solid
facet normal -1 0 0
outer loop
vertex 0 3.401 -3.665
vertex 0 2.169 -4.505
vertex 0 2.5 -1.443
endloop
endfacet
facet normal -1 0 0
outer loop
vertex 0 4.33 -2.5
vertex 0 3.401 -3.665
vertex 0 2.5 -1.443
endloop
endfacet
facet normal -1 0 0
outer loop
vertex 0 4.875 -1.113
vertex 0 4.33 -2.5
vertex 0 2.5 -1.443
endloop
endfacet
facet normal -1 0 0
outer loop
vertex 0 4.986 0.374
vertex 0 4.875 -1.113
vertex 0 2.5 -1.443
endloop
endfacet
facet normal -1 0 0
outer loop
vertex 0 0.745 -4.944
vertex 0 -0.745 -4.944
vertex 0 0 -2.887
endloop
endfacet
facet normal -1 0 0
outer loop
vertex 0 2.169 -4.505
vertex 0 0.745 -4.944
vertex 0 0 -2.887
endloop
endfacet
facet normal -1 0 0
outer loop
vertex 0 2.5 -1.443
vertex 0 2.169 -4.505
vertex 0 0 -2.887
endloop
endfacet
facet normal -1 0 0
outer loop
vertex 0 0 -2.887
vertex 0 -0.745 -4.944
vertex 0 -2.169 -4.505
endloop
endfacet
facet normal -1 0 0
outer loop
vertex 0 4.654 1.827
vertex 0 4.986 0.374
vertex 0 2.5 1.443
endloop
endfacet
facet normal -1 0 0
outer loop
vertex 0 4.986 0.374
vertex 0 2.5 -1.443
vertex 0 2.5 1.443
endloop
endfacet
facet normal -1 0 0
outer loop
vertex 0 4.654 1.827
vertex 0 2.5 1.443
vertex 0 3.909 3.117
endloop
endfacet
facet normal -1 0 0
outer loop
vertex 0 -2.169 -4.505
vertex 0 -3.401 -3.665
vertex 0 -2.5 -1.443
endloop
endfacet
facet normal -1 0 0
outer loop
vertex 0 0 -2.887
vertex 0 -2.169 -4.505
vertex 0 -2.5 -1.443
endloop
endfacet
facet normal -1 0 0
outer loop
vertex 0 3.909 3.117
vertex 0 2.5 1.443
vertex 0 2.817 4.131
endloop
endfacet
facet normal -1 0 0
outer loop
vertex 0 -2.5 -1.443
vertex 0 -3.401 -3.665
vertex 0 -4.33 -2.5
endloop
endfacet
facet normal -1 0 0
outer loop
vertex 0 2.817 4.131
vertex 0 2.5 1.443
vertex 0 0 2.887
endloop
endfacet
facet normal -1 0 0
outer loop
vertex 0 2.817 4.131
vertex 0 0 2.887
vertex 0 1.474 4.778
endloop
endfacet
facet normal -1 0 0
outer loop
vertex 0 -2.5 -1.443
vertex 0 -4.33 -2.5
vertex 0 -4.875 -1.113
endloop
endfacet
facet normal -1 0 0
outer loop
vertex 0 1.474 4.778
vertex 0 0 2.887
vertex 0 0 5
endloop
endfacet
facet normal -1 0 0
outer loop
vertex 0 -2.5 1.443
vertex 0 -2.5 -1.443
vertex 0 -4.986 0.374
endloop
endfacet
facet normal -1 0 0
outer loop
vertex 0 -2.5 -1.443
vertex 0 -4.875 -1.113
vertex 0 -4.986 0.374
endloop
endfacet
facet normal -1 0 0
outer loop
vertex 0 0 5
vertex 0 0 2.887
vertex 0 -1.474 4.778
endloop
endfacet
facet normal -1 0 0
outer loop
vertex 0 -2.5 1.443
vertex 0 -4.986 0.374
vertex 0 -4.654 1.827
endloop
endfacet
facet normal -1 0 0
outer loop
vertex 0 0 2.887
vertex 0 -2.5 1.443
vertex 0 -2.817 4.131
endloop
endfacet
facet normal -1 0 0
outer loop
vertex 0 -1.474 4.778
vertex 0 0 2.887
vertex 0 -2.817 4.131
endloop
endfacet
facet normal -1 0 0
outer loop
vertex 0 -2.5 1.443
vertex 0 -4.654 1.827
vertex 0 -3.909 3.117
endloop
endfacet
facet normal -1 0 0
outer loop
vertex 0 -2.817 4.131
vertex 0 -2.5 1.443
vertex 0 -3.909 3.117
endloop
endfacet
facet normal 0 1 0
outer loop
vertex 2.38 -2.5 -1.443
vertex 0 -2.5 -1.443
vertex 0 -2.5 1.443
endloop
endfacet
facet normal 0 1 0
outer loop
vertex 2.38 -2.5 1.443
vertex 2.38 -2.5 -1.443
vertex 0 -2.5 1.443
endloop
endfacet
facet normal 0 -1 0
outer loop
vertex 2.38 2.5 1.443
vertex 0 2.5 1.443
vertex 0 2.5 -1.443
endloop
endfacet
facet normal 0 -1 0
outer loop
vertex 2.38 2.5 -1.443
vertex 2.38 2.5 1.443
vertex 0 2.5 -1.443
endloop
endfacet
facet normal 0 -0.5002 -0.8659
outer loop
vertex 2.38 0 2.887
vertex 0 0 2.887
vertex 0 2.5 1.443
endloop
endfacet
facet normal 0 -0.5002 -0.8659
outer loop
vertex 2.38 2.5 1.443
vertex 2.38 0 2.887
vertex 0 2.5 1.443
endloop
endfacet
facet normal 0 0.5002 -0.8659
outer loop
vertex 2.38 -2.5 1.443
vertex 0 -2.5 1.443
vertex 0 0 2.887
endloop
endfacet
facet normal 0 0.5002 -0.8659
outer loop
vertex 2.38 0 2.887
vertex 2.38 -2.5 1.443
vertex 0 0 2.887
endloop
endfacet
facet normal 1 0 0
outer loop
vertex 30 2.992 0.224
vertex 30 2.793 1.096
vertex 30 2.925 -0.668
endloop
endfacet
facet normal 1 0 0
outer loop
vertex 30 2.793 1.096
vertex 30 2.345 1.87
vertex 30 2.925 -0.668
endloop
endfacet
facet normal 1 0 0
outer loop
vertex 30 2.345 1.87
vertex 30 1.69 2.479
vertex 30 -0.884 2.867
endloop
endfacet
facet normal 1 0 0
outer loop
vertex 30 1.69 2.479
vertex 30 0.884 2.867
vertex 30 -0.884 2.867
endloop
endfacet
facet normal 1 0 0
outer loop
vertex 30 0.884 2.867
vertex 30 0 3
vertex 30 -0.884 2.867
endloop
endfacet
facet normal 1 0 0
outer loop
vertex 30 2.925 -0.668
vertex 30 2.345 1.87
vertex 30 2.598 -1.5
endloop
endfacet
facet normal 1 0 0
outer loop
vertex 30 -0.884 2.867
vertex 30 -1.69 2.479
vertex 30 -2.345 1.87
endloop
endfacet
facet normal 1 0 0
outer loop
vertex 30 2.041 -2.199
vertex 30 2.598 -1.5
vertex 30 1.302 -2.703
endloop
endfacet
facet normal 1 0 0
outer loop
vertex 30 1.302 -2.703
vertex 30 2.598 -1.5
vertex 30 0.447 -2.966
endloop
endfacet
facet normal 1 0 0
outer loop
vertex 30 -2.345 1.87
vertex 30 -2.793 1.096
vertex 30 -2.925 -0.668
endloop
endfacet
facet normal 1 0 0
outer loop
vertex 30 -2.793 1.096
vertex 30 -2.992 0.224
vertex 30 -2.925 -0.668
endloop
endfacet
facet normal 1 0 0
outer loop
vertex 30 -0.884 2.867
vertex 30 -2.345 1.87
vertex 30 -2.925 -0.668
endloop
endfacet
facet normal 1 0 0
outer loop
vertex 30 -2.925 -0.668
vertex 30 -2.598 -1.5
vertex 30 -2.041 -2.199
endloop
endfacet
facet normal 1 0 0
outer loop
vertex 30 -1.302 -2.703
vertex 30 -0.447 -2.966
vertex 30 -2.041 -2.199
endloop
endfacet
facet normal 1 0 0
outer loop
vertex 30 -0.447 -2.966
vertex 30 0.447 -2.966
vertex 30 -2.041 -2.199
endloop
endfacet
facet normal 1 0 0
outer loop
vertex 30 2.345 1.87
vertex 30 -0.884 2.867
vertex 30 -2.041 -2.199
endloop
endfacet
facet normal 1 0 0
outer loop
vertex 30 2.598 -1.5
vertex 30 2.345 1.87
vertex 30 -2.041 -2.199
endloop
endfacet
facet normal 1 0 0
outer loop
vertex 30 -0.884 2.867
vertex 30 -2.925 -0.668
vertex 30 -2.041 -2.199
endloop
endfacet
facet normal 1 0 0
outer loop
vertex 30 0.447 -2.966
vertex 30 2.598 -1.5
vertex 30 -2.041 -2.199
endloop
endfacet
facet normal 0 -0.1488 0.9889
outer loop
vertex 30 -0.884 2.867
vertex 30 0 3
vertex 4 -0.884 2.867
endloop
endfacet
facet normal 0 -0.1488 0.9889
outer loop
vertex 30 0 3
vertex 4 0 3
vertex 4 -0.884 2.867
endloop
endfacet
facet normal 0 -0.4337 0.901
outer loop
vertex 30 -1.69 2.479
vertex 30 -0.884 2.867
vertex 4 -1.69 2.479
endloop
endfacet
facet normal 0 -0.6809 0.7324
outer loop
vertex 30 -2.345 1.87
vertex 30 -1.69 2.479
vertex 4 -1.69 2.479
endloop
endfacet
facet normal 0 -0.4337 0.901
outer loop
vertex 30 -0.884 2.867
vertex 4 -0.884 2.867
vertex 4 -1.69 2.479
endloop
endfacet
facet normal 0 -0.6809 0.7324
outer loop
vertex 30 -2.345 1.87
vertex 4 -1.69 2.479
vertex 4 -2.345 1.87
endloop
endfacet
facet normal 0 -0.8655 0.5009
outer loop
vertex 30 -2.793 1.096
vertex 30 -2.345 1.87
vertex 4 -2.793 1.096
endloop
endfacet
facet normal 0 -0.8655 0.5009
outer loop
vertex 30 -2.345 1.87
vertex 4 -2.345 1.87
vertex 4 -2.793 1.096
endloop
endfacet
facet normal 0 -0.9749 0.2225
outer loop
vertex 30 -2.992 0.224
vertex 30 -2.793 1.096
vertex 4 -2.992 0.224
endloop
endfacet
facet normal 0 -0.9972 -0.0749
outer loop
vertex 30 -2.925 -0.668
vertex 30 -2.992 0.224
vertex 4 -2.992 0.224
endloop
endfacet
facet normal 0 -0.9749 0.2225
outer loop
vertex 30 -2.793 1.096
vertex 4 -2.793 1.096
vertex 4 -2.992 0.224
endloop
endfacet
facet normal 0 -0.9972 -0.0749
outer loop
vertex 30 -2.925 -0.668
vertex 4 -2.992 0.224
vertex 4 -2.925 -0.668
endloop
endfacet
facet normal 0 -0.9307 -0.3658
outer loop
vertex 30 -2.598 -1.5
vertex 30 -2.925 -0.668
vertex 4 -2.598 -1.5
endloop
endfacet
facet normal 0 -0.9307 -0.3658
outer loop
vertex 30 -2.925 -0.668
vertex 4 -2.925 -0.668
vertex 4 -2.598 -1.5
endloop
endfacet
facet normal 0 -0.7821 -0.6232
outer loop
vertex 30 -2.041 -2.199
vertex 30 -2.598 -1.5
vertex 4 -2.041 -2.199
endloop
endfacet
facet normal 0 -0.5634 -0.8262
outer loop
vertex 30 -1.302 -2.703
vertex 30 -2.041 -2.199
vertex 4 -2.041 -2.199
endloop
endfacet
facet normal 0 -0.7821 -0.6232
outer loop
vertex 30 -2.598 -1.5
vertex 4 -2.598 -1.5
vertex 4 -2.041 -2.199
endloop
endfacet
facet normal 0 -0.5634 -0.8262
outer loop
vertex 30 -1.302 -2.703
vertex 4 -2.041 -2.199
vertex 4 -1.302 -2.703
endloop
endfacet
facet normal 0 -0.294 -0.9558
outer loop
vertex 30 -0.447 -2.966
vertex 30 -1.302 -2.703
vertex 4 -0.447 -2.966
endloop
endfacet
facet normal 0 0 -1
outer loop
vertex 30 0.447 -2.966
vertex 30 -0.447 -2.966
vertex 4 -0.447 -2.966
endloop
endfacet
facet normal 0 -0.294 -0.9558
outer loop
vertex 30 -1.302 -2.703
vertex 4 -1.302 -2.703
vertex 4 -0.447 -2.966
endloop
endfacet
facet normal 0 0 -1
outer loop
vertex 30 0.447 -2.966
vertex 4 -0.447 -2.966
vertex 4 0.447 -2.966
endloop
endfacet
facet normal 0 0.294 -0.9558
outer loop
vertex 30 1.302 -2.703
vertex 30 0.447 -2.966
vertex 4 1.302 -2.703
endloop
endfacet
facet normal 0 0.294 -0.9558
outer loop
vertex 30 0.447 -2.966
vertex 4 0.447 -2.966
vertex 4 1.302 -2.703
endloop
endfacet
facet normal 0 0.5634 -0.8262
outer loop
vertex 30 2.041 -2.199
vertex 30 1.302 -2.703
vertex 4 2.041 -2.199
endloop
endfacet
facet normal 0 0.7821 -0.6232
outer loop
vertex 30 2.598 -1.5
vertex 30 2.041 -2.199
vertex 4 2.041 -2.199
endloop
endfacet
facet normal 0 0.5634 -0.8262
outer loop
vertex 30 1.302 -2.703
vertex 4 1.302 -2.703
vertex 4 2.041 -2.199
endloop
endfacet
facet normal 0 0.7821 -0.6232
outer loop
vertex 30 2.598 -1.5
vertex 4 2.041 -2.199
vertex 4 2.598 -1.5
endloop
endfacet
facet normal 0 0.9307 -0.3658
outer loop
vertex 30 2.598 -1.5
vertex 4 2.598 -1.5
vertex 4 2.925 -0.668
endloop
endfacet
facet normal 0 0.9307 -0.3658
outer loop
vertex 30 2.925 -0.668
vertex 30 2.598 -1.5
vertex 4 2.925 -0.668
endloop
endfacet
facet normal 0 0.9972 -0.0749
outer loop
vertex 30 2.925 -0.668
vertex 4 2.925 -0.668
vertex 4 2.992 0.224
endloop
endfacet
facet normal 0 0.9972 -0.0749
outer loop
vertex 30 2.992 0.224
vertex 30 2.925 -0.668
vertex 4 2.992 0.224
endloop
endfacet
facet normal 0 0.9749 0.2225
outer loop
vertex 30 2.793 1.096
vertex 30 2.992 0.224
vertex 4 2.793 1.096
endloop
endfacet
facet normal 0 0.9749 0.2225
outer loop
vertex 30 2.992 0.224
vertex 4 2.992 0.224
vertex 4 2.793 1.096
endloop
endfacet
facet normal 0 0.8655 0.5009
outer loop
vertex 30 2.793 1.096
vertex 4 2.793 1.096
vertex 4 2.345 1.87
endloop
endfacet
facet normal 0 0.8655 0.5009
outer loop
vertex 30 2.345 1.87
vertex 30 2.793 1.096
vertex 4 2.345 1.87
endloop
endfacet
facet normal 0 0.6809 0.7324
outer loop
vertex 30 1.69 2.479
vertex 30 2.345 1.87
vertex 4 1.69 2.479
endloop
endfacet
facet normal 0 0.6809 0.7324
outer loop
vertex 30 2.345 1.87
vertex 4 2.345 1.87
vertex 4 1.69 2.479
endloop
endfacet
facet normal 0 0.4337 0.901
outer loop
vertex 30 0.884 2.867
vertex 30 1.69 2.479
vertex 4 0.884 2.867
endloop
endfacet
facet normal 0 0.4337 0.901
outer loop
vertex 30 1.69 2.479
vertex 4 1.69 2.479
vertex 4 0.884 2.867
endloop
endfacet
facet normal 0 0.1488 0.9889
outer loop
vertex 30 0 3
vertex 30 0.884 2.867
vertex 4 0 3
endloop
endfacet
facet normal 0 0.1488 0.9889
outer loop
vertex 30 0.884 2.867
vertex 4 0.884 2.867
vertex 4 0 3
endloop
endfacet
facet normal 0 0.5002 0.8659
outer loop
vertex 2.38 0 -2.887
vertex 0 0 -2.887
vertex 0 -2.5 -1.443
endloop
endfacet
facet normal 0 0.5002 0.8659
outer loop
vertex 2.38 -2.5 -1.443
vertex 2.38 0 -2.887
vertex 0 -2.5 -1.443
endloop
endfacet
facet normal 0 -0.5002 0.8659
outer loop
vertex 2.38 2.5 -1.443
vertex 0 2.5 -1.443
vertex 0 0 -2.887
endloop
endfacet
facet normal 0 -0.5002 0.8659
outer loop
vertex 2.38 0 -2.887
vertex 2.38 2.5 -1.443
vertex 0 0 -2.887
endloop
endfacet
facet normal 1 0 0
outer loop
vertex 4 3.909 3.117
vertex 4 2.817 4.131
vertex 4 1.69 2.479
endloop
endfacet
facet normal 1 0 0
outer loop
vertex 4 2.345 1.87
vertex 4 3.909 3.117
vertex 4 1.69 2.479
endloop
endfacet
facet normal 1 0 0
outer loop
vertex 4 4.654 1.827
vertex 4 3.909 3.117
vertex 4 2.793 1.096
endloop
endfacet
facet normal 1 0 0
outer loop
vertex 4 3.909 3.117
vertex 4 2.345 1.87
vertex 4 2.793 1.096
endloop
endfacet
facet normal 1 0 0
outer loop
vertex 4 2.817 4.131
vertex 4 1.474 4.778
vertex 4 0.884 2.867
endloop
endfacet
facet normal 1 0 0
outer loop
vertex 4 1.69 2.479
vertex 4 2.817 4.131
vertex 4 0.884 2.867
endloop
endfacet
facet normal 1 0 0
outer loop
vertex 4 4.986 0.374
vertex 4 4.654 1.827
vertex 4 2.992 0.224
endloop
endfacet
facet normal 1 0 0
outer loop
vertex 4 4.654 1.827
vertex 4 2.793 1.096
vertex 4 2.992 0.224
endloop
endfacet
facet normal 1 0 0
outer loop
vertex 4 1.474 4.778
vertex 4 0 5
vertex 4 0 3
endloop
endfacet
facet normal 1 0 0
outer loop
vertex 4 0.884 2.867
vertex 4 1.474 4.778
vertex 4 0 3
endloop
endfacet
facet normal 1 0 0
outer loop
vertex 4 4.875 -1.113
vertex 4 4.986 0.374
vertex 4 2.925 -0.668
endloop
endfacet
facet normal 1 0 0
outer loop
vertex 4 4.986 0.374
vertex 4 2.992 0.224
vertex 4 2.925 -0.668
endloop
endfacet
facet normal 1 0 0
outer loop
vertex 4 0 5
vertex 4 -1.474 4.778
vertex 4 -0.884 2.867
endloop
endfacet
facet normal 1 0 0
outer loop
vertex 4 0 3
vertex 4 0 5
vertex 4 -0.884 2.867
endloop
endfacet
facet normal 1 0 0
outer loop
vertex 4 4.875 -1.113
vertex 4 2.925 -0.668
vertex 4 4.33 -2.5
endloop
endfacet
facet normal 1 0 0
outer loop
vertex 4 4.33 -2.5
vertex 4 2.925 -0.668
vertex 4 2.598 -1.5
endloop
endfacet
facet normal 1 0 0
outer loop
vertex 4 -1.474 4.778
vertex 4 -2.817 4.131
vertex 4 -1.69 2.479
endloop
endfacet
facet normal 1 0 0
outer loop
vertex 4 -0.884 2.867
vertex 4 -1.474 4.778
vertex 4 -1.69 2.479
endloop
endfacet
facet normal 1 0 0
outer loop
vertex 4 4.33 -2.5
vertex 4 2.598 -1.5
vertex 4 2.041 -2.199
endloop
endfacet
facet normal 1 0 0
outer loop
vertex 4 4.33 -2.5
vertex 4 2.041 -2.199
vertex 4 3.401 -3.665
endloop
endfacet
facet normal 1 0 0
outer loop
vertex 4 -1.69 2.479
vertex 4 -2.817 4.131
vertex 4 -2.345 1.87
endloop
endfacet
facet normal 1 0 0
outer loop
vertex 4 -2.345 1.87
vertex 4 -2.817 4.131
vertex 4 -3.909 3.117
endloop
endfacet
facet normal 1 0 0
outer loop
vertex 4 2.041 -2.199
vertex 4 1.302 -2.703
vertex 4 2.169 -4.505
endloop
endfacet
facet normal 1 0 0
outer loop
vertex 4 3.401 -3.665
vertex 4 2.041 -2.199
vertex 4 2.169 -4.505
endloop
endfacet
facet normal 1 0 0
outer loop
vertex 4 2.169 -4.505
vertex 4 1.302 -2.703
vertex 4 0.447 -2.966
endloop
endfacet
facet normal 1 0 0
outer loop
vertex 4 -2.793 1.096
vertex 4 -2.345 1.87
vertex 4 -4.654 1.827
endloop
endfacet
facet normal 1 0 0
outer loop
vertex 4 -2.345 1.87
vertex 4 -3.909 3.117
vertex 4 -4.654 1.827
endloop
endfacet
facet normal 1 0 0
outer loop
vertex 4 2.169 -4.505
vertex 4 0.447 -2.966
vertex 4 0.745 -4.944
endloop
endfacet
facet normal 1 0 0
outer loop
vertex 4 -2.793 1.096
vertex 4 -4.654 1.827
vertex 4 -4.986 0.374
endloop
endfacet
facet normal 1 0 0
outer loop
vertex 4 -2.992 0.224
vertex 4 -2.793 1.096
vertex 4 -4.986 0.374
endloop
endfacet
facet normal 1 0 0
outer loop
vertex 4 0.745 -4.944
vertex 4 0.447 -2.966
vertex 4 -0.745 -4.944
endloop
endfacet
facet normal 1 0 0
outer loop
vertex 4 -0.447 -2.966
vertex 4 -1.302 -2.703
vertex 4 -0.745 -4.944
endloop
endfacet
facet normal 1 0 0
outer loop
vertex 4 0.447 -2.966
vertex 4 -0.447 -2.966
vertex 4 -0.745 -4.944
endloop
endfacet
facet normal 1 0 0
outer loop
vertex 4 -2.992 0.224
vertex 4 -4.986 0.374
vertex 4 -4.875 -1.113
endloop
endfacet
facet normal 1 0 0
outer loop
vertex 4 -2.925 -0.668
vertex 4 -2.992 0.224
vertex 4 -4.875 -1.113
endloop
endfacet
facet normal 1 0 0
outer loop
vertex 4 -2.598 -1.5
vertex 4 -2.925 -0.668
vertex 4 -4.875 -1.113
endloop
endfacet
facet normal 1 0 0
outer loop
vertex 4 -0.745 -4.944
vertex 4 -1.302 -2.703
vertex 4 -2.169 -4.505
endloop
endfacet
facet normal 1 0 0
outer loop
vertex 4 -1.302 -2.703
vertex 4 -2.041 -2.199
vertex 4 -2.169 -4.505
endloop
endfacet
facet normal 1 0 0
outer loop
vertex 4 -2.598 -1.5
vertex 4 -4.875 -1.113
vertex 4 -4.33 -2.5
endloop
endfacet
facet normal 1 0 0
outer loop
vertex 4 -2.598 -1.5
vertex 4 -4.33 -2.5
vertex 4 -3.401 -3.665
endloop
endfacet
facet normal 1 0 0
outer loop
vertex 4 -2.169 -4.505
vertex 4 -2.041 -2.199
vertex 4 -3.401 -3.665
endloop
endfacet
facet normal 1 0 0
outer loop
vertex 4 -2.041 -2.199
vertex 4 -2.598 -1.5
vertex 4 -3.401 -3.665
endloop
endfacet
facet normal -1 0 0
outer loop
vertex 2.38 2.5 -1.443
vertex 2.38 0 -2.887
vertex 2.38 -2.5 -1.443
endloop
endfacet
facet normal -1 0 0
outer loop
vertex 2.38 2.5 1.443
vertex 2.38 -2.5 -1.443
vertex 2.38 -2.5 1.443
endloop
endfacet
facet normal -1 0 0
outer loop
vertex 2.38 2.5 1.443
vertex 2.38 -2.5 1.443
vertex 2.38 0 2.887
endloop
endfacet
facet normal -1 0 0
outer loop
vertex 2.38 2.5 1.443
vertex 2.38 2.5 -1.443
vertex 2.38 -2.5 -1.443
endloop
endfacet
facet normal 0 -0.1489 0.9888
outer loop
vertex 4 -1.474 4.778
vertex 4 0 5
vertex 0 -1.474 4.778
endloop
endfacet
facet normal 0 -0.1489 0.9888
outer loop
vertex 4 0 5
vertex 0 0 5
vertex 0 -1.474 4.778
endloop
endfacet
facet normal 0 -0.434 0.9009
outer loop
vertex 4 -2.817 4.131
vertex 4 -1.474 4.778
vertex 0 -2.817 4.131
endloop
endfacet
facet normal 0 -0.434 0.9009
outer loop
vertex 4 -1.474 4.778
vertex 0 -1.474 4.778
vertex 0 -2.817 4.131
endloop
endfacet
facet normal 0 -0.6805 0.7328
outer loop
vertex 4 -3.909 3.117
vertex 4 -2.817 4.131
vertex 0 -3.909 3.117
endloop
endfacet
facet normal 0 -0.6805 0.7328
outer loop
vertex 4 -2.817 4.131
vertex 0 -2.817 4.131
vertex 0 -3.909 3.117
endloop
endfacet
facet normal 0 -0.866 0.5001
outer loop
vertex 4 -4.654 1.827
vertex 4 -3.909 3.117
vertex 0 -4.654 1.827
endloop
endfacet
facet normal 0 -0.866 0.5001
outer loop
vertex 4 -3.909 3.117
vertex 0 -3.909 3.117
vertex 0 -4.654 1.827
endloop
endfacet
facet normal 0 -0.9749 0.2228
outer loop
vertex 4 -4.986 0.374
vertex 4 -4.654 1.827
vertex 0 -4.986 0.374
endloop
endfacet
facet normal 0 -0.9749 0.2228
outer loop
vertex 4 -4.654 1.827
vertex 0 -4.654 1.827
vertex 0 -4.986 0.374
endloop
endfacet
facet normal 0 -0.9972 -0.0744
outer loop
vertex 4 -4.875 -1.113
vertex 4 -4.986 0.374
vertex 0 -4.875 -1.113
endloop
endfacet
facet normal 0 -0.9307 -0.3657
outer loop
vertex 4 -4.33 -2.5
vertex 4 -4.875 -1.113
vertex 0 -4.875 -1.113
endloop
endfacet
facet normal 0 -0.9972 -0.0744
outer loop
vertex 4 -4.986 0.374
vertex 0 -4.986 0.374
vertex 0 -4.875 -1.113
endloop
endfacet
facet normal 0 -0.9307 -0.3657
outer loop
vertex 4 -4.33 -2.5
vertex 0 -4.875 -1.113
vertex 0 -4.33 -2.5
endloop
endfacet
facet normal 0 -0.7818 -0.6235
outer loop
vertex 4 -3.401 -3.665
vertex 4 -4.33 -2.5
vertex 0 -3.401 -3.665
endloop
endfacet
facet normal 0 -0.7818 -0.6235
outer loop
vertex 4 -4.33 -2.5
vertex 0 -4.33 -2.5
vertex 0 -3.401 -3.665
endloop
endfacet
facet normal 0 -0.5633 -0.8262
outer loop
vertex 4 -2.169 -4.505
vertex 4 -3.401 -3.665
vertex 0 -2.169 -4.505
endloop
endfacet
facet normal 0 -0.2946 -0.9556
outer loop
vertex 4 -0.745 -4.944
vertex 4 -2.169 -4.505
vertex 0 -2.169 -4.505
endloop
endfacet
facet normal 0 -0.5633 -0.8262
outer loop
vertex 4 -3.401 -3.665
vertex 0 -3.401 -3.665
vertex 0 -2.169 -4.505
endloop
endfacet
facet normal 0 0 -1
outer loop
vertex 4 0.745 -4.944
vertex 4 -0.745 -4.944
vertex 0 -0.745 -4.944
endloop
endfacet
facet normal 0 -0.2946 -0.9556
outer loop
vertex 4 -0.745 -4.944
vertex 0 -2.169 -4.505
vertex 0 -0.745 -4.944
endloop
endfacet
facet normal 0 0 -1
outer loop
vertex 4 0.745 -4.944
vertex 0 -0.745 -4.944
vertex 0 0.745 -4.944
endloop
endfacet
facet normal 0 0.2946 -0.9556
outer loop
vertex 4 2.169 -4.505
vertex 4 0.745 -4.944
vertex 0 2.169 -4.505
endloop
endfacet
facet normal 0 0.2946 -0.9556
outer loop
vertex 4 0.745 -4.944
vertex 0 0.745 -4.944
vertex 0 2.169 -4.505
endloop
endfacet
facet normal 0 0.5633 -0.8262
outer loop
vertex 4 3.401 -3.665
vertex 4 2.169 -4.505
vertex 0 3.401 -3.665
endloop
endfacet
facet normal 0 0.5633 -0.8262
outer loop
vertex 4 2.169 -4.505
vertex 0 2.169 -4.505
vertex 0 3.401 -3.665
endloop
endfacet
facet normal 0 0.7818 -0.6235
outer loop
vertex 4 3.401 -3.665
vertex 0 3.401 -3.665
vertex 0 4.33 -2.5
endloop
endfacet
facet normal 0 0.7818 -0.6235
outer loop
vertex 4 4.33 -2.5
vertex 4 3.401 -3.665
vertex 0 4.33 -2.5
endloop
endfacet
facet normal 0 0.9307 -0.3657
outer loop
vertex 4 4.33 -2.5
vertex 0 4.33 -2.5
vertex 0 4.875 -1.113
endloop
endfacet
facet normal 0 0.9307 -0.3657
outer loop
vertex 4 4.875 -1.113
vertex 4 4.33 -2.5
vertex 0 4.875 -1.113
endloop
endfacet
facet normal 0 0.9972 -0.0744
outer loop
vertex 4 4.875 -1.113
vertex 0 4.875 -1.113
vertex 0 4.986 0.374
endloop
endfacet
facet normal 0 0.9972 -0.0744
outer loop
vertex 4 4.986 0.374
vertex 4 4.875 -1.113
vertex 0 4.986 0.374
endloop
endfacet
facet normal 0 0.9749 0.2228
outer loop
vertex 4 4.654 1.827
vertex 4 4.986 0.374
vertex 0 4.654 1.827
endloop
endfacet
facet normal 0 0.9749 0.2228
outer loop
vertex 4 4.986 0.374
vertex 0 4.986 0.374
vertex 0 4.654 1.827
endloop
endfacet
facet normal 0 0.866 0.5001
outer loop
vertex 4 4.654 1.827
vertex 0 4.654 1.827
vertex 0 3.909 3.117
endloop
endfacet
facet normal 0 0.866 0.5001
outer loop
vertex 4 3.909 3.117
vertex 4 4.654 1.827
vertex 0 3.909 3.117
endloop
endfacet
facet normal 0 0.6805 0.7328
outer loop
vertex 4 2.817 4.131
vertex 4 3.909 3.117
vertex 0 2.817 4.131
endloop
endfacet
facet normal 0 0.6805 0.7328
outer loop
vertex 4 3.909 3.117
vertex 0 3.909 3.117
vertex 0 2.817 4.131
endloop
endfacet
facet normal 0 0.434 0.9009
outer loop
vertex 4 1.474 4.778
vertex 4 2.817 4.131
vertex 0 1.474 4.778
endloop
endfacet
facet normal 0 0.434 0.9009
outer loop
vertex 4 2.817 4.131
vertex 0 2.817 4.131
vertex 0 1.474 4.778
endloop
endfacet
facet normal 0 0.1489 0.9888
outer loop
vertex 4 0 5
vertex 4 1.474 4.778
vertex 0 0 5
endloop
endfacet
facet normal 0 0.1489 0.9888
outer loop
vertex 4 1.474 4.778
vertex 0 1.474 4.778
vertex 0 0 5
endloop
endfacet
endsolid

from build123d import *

# Parameters (mm, degrees)
CUT_EXTRUDE1_DEPTH = 2.38


with BuildPart() as part:
    # Sketch1 → Revolve1 (revolve)
    with BuildSketch(Plane.XY, mode=Mode.PRIVATE) as revolve1_sk:
        Polygon((0, 0), (30, 0), (30, 3), (4, 3), (4, 5), (0, 5), align=None)
    revolve(revolve1_sk.sketch.rotate(Axis((0, 0, 0), (1, 0, 0)), 90), axis=Axis((0, 0, 0), (1, 0, 0)))

    # Sketch2 → Cut-Extrude1 (cut)
    with BuildSketch(Plane.ZY):
        Polygon((2.886751346, 0), (1.443375673, 2.5), (-1.443375673, 2.5), (-2.886751346, 0), (-1.443375673, -2.5), (1.443375673, -2.5), align=None)
    extrude(amount=-CUT_EXTRUDE1_DEPTH, mode=Mode.SUBTRACT)


solid = part.part
